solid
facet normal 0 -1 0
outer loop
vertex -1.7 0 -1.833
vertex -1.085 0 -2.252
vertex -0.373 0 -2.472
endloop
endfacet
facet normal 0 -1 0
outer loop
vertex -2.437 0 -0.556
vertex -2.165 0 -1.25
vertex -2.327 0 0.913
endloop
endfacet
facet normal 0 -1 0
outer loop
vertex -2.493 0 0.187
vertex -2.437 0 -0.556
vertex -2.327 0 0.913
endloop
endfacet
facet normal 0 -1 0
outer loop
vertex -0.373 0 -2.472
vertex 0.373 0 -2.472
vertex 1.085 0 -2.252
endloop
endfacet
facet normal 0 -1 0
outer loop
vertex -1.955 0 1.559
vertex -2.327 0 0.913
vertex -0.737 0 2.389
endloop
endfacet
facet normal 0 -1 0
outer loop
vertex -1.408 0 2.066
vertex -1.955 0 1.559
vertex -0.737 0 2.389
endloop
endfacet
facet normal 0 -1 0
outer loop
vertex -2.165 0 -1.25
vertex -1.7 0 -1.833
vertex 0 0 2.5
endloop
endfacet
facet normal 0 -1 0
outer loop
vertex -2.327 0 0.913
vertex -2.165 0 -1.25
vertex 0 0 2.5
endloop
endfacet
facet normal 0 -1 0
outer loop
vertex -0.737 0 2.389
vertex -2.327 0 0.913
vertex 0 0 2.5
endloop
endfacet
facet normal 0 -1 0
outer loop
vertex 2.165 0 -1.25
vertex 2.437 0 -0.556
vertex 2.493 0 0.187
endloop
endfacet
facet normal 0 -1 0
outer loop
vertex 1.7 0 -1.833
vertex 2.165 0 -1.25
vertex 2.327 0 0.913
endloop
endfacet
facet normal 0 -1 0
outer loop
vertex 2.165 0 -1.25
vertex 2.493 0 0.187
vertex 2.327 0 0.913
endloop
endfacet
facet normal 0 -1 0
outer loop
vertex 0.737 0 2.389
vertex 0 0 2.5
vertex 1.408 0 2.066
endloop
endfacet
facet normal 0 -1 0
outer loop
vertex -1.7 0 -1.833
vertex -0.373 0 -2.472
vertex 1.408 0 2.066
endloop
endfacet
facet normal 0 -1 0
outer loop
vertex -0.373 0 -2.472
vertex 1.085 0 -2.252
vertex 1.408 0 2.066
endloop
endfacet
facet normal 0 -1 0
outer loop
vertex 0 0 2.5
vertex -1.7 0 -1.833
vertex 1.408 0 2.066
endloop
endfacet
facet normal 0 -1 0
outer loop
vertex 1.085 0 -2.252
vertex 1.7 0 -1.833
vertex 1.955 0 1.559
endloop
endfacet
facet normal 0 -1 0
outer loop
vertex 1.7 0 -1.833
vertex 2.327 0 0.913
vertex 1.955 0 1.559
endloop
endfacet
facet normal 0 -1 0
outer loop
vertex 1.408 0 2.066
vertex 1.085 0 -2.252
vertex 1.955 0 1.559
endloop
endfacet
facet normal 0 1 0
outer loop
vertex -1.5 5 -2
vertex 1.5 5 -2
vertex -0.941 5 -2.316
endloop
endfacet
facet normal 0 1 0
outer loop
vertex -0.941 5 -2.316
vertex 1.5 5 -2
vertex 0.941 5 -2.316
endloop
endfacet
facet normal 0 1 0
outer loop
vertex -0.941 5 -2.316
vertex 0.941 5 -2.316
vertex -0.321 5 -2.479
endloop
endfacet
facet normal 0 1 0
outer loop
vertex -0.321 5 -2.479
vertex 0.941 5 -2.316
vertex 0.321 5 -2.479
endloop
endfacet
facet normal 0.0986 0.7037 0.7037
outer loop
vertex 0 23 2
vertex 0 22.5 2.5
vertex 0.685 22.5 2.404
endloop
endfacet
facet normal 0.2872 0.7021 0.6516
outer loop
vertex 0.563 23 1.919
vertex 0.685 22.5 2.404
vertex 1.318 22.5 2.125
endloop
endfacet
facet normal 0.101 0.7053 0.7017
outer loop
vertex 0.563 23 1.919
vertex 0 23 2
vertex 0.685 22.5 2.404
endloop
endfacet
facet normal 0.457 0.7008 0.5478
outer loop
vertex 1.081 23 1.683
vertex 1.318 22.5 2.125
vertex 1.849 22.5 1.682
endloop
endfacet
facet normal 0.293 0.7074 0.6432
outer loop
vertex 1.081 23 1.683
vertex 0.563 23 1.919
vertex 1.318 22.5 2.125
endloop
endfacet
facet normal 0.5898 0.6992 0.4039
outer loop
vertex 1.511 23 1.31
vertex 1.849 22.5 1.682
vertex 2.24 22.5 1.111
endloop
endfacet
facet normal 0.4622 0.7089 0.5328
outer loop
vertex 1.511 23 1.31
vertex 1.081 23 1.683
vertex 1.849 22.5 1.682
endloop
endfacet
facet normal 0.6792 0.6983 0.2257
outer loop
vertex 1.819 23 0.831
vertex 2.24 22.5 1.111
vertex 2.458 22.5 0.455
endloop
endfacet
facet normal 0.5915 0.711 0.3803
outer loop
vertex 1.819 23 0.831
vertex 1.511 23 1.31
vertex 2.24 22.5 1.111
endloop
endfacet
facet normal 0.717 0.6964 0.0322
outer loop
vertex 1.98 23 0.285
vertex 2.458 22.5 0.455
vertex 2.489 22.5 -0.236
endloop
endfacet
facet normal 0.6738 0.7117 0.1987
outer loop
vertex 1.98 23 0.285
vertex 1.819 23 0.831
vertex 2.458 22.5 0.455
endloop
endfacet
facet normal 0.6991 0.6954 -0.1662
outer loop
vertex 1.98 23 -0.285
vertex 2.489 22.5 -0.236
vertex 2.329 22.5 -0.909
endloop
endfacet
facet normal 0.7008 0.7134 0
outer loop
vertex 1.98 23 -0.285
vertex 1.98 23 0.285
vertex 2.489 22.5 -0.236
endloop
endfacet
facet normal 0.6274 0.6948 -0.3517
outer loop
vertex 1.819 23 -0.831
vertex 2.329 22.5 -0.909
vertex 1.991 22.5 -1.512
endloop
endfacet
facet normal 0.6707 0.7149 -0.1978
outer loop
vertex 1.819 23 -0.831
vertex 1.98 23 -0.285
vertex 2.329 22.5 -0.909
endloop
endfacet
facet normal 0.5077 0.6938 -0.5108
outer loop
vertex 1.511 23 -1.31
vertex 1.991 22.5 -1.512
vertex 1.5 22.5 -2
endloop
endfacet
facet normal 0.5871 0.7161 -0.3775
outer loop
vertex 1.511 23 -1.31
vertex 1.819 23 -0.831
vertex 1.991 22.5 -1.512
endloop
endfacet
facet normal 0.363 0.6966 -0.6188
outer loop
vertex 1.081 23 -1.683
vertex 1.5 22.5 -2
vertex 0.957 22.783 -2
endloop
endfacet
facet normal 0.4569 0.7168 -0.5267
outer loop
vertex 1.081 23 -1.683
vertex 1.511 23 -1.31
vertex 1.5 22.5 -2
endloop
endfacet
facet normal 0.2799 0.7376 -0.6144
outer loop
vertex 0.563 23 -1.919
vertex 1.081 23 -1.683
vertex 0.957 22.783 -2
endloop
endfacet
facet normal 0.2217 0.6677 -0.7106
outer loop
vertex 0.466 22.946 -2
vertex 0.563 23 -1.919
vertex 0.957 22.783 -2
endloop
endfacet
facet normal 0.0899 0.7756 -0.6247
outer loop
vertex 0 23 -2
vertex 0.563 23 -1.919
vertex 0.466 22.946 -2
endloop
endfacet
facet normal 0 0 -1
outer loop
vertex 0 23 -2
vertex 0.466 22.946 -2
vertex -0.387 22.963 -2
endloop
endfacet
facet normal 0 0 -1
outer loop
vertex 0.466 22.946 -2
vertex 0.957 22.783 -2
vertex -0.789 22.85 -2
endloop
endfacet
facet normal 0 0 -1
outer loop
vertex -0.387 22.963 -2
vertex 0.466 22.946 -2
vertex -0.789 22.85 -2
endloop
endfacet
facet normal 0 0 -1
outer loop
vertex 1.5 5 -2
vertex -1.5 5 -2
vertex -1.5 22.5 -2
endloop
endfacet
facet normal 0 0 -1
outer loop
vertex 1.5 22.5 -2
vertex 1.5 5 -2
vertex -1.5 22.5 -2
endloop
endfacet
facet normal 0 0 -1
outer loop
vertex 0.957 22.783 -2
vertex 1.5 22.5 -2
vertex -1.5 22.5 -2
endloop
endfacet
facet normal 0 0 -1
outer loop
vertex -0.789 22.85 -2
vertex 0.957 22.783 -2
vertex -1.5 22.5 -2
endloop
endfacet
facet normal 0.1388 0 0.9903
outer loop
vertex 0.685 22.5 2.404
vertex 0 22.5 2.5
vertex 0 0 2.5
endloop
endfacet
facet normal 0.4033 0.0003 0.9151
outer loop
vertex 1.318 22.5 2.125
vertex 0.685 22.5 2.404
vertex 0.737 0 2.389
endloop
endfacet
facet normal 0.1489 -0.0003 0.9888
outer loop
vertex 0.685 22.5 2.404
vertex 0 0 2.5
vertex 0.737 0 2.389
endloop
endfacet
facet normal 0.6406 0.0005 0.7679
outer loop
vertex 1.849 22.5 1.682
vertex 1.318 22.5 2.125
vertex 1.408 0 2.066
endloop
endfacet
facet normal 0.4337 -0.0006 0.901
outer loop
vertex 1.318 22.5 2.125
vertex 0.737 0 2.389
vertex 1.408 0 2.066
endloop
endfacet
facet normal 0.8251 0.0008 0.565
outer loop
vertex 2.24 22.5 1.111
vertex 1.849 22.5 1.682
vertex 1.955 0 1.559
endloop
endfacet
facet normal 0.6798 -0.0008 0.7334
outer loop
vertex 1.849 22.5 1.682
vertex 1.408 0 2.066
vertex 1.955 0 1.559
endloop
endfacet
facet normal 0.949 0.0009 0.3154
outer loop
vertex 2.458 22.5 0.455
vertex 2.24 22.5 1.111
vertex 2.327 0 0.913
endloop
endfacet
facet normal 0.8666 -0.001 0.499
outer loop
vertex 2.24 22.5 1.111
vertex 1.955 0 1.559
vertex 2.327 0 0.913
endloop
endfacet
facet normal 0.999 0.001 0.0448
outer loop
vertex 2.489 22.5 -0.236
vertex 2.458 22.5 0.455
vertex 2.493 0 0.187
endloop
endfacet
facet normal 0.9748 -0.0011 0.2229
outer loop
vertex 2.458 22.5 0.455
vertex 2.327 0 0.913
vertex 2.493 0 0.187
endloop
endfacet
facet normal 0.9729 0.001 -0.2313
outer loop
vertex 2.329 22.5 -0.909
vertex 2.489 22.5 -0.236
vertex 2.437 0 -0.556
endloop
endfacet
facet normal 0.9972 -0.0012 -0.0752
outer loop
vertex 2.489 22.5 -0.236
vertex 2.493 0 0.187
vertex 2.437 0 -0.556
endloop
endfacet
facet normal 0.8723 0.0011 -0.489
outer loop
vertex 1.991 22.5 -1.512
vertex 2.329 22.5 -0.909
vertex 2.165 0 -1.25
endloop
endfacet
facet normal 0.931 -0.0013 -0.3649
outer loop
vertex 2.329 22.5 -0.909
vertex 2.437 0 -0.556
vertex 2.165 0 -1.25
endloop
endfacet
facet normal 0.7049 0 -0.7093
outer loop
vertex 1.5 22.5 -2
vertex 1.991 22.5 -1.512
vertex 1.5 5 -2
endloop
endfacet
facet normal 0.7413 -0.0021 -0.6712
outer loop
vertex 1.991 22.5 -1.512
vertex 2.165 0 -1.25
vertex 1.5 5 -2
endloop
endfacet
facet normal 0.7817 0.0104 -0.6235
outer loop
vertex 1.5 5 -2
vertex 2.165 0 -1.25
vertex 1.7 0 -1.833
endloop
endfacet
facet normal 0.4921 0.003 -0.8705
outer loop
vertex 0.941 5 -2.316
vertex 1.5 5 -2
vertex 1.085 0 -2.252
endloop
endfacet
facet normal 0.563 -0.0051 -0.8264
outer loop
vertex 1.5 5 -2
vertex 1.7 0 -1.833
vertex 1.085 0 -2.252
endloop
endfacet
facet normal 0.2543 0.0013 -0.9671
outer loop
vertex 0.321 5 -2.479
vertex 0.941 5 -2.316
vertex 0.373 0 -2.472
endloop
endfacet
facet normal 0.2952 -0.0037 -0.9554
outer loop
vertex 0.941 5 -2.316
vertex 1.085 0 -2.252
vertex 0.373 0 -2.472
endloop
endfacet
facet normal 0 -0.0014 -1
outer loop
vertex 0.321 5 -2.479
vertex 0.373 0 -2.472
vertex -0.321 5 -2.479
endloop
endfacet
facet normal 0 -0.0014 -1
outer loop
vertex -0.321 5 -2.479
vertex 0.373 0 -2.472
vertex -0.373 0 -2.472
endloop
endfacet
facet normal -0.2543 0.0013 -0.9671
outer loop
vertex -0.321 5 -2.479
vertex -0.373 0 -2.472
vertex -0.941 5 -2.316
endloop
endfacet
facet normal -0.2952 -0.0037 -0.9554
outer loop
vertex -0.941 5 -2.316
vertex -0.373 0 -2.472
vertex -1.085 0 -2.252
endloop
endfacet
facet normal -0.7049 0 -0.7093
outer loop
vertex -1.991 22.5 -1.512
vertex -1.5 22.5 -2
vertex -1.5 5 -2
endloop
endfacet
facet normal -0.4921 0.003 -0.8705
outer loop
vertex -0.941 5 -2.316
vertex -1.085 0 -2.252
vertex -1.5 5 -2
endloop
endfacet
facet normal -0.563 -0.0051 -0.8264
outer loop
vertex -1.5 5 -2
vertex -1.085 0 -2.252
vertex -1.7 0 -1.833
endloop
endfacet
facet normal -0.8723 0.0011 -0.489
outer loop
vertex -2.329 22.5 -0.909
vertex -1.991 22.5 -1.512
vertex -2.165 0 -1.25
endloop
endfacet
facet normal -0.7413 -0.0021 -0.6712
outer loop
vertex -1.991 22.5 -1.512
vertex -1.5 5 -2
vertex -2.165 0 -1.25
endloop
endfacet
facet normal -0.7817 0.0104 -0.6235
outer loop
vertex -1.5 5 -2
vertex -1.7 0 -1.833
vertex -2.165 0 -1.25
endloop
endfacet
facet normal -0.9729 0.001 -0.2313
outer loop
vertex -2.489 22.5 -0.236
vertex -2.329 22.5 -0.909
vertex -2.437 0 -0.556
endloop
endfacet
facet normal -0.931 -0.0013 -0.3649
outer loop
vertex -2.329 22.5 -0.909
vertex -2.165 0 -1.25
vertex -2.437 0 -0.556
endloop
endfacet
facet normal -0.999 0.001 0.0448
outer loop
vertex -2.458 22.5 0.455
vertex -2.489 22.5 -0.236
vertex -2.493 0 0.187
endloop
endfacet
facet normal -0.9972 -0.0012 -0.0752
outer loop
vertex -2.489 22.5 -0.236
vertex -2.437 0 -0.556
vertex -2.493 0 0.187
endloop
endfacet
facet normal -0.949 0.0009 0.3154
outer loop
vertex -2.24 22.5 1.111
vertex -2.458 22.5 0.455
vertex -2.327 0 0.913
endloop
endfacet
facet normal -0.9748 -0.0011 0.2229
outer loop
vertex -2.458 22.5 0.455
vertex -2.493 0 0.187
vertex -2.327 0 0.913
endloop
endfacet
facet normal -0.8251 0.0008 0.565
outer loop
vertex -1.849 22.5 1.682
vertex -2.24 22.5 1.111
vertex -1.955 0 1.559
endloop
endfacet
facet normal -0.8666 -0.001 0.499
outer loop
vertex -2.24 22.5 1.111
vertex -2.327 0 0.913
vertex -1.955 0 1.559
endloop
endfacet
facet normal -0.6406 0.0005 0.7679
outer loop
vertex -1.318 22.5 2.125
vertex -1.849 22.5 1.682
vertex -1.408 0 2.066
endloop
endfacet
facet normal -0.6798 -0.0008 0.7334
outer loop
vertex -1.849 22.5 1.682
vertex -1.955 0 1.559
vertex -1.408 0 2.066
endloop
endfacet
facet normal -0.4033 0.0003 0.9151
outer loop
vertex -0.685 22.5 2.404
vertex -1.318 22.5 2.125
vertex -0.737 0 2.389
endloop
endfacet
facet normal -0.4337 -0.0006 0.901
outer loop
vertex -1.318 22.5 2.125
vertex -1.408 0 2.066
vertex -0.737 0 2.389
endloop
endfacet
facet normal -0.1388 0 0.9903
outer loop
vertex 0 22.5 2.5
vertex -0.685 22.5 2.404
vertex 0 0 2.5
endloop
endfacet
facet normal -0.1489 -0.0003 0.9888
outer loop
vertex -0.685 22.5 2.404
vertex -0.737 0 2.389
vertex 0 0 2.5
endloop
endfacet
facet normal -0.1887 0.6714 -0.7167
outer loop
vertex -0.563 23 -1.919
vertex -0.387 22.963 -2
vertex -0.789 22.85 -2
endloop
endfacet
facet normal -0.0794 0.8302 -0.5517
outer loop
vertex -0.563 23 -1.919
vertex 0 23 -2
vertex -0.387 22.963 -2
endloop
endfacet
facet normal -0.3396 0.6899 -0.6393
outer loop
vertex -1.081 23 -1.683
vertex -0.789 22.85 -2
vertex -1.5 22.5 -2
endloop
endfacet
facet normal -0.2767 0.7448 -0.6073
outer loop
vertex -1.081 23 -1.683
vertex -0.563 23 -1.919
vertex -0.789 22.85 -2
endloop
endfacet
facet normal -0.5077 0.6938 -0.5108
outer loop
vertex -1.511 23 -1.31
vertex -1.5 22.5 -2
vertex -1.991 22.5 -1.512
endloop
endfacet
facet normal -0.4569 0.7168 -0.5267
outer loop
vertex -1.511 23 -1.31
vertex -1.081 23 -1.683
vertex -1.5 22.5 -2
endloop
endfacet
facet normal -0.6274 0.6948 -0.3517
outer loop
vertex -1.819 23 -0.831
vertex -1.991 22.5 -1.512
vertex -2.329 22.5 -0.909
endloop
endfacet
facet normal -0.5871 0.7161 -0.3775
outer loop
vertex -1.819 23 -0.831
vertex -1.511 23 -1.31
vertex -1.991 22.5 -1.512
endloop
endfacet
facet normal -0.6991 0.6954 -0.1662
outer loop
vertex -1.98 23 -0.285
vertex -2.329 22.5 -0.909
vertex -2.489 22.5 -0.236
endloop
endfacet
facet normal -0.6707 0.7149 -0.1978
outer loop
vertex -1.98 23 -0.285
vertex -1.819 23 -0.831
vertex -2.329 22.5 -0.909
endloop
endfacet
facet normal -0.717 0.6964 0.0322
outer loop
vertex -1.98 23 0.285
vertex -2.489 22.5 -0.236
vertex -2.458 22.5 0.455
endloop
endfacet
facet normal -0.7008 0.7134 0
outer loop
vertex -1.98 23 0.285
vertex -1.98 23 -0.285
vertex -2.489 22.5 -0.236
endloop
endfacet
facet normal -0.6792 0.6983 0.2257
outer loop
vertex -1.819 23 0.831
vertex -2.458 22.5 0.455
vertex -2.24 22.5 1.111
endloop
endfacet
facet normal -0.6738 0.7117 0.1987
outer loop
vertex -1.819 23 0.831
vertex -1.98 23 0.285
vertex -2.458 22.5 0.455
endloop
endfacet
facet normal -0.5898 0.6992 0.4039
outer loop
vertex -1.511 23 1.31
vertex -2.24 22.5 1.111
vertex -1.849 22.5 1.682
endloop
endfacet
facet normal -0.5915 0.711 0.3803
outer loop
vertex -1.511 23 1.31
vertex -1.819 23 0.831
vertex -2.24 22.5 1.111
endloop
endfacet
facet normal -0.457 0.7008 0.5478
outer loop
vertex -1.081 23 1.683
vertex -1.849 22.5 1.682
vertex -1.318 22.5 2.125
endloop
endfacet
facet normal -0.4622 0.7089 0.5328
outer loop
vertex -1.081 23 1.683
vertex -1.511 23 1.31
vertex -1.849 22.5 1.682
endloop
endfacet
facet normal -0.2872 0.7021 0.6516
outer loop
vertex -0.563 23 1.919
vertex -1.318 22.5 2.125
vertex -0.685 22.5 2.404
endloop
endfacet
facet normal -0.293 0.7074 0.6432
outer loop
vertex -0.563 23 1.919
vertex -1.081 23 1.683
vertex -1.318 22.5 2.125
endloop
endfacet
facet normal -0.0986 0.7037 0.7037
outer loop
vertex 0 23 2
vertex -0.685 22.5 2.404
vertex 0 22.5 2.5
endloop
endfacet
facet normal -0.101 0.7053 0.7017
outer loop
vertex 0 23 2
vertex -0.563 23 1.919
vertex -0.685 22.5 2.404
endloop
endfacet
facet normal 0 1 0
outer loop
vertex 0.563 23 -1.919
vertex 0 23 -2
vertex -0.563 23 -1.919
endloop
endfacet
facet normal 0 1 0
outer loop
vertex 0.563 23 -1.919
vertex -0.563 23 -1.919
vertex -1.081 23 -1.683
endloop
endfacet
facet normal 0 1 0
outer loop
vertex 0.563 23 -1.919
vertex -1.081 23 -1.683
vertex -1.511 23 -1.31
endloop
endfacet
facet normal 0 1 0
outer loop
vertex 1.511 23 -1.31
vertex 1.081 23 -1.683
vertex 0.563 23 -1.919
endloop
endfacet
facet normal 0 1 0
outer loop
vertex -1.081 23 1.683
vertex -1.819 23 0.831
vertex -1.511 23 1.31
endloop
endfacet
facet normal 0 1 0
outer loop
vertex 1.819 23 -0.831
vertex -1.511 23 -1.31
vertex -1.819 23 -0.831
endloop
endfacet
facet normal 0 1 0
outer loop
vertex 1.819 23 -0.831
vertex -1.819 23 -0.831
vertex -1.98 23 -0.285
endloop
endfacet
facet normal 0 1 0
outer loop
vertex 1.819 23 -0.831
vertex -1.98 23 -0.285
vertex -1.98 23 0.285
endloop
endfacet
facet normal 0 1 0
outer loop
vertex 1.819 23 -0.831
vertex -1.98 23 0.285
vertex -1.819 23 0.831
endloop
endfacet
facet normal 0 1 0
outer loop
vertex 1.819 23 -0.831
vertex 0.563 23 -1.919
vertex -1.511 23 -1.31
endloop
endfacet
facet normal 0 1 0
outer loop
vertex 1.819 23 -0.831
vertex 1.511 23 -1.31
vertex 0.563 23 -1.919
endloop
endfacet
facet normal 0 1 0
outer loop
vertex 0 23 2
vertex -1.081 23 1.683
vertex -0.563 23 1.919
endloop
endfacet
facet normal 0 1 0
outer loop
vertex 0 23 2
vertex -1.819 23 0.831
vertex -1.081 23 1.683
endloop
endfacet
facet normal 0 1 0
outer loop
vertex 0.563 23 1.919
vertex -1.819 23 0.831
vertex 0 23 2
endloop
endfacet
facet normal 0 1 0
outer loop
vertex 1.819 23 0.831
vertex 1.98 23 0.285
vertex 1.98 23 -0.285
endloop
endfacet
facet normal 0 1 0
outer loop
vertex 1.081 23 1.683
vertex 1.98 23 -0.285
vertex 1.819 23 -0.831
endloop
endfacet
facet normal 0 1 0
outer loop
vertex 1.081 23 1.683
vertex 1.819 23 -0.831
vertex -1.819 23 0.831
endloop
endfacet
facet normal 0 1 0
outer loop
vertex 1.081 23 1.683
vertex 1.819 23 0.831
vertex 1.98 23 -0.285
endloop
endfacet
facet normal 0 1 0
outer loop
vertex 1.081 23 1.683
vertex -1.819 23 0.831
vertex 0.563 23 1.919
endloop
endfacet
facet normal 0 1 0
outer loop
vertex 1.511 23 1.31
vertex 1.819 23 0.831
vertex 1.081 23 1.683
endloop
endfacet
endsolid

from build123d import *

# Parameters (mm, degrees)
SKETCH1_R               = 2.5
BOSS_EXTRUDE1_DEPTH     = 23
CHAMFER1_SIZE           = 0.5
CUT_EXTRUDE1_DEPTH      = 24.270152556
CUT_EXTRUDE1_DEPTH_BACK = 24.270152556
SKETCH2_W               = 0.5
SKETCH2_H               = 18


with BuildPart() as part:
    # Sketch1 → Boss-Extrude1 (new body)
    with BuildSketch(Plane(origin=(0, 0, 0), x_dir=(1, 0, 0), z_dir=(0, 1, 0))):
        with Locations(Location((0, 0, 0), (0, 0, 270))):
            Circle(SKETCH1_R)
    extrude(amount=BOSS_EXTRUDE1_DEPTH)

    # Chamfer1
    chamfer1_edges = [part.edges().sort_by_distance(p)[0] for p in [
        (0, 23, -2.5),
    ]]
    chamfer(chamfer1_edges, length=CHAMFER1_SIZE)

    # Sketch2 → Cut-Extrude1 (cut, two sides: drawn at the far end of the back side and taken through both)
    with BuildSketch(Plane(origin=(0, 0, 0), x_dir=(0, 0, -1), z_dir=(1, 0, 0)).offset(-CUT_EXTRUDE1_DEPTH_BACK)):
        with Locations((2.25, 14)):
            Rectangle(SKETCH2_W, SKETCH2_H)
    extrude(amount=CUT_EXTRUDE1_DEPTH + CUT_EXTRUDE1_DEPTH_BACK, mode=Mode.SUBTRACT)


solid = part.part
